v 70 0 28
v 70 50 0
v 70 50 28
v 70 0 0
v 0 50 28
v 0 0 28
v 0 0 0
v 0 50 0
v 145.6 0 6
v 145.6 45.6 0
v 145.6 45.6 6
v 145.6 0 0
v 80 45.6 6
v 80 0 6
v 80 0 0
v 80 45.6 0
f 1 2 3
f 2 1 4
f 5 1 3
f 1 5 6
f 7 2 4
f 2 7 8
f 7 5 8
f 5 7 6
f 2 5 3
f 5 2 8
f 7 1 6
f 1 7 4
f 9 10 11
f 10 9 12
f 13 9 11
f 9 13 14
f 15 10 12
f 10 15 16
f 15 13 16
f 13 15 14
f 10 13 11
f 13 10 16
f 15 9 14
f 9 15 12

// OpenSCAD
// Two-part enclosure for a small electronics board (e.g. Arduino-based temperature logger)
// Print orientation: both parts lie flat on the bed, side by side, with a 10 mm gap.
// The box prints open-top; the lid prints upside down so its lip faces up and slides into the box.

// ---------------- Parameters ----------------
box_x      = 70;    // box outer length (X)
box_y      = 50;    // box outer width (Y)
box_h      = 30;    // box outer height (Z)
wall       = 2;     // wall thickness
floor      = 2;     // floor thickness under the board

lip_t      = 1.5;   // lip wall thickness
lip_h      = 4;     // lip height above the plate
lip_x      = 65.6;  // lip outer length (X)
lip_y      = 45.6;  // lip outer width (Y)
clearance  = 0.2;   // clearance between lip outer size and box opening

eps        = 0.5;   // overcut for clean boolean differences

$fn = 64;

// ---------------- Derived ----------------
box_i_x = box_x - 2 * wall;   // inner length
box_i_y = box_y - 2 * wall;   // inner width
lip_x1  = lip_x - 2 * clearance;
lip_y1  = lip_y - 2 * clearance;   // not used directly, kept for symmetry

// ---------------- Model ----------------
difference() {
    union() {
        // Box: solid floor + walls, open top
        cube([box_x, box_y, box_h - floor]);

        // Lid: plate + centred lip (printed upside down)
        translate([box_x + 10, 0, 0])
            cube([lip_x, lip_y, floor + lip_h]);
    }

    // Lip pocket cut into the box top, with 0.2 mm clearance on each side
    translate([box_x + 10 - floor - eps, 0, box_h - floor])
        cube([lip_x1, lip_y1, floor + lip_h + eps]);
}
